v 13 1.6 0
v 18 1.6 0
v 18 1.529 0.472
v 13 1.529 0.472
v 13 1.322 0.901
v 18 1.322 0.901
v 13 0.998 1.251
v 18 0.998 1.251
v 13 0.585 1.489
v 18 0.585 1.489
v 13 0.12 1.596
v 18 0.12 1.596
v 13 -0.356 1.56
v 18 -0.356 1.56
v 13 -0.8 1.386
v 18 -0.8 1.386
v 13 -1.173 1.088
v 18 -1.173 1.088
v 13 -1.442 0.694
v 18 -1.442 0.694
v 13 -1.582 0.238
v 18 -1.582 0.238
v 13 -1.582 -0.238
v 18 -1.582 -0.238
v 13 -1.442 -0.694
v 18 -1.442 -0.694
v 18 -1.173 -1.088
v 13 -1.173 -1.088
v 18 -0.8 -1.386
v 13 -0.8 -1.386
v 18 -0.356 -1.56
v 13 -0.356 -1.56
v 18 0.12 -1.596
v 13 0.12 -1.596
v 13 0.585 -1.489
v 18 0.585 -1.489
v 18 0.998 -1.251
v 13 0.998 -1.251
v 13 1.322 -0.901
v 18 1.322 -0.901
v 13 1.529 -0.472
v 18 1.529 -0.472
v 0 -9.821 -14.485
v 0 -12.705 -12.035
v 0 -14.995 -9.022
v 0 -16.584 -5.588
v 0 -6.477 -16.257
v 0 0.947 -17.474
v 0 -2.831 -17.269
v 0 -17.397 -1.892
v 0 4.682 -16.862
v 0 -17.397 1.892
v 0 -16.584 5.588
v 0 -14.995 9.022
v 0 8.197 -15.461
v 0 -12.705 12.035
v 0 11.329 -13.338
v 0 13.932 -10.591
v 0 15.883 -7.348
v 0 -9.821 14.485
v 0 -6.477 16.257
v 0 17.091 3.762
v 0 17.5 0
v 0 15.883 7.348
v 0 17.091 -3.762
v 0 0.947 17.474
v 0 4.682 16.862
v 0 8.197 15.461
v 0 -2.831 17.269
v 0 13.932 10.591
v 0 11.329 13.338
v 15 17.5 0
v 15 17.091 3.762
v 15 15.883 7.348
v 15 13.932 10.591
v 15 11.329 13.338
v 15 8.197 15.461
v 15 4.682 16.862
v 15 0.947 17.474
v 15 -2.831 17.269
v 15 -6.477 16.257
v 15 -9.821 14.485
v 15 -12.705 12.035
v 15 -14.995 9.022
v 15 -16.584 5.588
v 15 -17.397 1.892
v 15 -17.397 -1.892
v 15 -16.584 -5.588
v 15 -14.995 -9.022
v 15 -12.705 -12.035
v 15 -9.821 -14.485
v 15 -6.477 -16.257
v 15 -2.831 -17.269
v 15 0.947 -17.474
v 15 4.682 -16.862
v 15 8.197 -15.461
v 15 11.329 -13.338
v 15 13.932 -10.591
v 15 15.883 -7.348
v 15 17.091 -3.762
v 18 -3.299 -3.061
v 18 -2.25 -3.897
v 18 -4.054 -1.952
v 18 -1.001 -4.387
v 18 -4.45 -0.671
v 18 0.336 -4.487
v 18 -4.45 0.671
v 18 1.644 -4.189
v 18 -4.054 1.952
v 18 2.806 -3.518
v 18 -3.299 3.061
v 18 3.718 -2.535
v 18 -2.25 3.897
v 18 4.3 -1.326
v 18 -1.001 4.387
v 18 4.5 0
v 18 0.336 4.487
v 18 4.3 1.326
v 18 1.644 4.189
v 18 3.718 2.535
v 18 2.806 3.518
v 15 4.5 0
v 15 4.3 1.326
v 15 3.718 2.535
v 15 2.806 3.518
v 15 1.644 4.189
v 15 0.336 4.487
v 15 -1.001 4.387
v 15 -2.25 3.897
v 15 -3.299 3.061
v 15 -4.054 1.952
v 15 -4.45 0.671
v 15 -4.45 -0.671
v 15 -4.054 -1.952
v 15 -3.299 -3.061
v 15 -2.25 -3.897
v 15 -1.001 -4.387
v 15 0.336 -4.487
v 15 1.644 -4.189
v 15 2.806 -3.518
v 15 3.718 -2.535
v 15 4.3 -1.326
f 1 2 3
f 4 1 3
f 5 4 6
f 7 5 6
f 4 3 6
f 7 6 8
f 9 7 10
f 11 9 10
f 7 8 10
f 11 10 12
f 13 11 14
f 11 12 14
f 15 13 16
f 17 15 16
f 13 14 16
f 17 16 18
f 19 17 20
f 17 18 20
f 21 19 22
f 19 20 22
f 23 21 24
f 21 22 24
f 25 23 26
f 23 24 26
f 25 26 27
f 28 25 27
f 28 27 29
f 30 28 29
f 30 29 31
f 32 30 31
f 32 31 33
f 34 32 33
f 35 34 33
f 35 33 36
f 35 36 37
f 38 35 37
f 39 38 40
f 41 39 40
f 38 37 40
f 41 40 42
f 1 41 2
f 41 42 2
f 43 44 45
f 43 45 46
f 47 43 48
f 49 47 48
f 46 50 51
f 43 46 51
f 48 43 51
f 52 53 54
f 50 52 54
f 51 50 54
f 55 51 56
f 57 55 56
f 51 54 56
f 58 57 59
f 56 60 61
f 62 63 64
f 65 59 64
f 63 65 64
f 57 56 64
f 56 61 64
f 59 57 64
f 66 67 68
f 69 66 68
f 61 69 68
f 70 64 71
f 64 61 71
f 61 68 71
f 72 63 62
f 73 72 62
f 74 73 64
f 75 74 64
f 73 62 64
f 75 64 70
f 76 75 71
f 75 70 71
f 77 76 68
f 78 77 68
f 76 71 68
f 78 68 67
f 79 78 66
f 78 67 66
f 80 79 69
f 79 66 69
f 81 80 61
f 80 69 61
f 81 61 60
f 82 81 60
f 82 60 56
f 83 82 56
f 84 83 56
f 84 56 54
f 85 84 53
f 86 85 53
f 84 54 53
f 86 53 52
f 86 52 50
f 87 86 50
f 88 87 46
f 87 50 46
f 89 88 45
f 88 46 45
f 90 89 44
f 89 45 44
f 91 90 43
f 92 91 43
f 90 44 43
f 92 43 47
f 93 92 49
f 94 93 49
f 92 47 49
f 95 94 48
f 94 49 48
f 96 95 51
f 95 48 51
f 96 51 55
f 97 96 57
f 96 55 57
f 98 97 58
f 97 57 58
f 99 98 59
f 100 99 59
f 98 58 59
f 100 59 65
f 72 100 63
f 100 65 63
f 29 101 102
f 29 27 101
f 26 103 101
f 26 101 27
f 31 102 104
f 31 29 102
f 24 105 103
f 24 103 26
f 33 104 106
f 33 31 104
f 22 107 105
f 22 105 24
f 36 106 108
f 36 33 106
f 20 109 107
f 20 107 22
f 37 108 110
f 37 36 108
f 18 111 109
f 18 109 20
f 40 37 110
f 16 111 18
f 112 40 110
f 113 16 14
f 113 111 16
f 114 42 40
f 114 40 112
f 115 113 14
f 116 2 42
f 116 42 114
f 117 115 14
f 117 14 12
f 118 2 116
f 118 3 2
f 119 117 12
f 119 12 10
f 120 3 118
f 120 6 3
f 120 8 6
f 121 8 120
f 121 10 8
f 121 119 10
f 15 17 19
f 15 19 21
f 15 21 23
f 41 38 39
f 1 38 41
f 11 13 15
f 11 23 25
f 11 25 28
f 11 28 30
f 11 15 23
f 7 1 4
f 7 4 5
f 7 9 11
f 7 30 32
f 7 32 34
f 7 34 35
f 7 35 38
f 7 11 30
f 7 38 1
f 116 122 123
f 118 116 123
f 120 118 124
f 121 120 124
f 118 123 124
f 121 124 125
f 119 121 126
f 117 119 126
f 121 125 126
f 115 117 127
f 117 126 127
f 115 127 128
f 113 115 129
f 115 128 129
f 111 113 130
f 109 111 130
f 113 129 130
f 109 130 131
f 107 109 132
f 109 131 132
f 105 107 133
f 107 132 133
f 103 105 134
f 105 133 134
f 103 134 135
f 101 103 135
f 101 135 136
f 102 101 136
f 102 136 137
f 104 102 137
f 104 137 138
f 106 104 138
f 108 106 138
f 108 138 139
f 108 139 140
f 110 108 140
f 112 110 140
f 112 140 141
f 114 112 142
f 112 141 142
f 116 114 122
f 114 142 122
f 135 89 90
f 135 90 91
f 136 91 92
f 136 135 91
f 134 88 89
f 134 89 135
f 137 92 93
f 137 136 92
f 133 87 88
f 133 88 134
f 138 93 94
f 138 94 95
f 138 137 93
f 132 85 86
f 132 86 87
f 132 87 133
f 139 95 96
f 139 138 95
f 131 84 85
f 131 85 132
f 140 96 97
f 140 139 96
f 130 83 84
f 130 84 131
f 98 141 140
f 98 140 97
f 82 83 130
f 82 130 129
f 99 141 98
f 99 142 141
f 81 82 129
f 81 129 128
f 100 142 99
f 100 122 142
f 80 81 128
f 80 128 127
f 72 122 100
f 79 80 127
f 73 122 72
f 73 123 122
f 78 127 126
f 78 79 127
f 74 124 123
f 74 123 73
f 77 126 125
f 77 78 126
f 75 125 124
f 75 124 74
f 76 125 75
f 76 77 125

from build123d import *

# Parameters (mm, degrees)
F0_R     = 17.5
F1_DEPTH = 15
F2_R     = 4.5
F3_DEPTH = 3
F4_R     = 1.6
F5_DEPTH = 5


with BuildPart() as f1:
    # F0 (on Right) → F1 (new body)
    with BuildSketch(Plane.YZ):
        Circle(F0_R)
    extrude(amount=F1_DEPTH)

    # F2 (on face) → F3 (join)
    with BuildSketch(Plane.YZ.offset(15)):
        Circle(F2_R)
    extrude(amount=F3_DEPTH)

    # F4 (on face) → F5 (cut)
    with BuildSketch(Plane.YZ.offset(18)):
        Circle(F4_R)
    extrude(amount=-F5_DEPTH, mode=Mode.SUBTRACT)


solid = f1.part
